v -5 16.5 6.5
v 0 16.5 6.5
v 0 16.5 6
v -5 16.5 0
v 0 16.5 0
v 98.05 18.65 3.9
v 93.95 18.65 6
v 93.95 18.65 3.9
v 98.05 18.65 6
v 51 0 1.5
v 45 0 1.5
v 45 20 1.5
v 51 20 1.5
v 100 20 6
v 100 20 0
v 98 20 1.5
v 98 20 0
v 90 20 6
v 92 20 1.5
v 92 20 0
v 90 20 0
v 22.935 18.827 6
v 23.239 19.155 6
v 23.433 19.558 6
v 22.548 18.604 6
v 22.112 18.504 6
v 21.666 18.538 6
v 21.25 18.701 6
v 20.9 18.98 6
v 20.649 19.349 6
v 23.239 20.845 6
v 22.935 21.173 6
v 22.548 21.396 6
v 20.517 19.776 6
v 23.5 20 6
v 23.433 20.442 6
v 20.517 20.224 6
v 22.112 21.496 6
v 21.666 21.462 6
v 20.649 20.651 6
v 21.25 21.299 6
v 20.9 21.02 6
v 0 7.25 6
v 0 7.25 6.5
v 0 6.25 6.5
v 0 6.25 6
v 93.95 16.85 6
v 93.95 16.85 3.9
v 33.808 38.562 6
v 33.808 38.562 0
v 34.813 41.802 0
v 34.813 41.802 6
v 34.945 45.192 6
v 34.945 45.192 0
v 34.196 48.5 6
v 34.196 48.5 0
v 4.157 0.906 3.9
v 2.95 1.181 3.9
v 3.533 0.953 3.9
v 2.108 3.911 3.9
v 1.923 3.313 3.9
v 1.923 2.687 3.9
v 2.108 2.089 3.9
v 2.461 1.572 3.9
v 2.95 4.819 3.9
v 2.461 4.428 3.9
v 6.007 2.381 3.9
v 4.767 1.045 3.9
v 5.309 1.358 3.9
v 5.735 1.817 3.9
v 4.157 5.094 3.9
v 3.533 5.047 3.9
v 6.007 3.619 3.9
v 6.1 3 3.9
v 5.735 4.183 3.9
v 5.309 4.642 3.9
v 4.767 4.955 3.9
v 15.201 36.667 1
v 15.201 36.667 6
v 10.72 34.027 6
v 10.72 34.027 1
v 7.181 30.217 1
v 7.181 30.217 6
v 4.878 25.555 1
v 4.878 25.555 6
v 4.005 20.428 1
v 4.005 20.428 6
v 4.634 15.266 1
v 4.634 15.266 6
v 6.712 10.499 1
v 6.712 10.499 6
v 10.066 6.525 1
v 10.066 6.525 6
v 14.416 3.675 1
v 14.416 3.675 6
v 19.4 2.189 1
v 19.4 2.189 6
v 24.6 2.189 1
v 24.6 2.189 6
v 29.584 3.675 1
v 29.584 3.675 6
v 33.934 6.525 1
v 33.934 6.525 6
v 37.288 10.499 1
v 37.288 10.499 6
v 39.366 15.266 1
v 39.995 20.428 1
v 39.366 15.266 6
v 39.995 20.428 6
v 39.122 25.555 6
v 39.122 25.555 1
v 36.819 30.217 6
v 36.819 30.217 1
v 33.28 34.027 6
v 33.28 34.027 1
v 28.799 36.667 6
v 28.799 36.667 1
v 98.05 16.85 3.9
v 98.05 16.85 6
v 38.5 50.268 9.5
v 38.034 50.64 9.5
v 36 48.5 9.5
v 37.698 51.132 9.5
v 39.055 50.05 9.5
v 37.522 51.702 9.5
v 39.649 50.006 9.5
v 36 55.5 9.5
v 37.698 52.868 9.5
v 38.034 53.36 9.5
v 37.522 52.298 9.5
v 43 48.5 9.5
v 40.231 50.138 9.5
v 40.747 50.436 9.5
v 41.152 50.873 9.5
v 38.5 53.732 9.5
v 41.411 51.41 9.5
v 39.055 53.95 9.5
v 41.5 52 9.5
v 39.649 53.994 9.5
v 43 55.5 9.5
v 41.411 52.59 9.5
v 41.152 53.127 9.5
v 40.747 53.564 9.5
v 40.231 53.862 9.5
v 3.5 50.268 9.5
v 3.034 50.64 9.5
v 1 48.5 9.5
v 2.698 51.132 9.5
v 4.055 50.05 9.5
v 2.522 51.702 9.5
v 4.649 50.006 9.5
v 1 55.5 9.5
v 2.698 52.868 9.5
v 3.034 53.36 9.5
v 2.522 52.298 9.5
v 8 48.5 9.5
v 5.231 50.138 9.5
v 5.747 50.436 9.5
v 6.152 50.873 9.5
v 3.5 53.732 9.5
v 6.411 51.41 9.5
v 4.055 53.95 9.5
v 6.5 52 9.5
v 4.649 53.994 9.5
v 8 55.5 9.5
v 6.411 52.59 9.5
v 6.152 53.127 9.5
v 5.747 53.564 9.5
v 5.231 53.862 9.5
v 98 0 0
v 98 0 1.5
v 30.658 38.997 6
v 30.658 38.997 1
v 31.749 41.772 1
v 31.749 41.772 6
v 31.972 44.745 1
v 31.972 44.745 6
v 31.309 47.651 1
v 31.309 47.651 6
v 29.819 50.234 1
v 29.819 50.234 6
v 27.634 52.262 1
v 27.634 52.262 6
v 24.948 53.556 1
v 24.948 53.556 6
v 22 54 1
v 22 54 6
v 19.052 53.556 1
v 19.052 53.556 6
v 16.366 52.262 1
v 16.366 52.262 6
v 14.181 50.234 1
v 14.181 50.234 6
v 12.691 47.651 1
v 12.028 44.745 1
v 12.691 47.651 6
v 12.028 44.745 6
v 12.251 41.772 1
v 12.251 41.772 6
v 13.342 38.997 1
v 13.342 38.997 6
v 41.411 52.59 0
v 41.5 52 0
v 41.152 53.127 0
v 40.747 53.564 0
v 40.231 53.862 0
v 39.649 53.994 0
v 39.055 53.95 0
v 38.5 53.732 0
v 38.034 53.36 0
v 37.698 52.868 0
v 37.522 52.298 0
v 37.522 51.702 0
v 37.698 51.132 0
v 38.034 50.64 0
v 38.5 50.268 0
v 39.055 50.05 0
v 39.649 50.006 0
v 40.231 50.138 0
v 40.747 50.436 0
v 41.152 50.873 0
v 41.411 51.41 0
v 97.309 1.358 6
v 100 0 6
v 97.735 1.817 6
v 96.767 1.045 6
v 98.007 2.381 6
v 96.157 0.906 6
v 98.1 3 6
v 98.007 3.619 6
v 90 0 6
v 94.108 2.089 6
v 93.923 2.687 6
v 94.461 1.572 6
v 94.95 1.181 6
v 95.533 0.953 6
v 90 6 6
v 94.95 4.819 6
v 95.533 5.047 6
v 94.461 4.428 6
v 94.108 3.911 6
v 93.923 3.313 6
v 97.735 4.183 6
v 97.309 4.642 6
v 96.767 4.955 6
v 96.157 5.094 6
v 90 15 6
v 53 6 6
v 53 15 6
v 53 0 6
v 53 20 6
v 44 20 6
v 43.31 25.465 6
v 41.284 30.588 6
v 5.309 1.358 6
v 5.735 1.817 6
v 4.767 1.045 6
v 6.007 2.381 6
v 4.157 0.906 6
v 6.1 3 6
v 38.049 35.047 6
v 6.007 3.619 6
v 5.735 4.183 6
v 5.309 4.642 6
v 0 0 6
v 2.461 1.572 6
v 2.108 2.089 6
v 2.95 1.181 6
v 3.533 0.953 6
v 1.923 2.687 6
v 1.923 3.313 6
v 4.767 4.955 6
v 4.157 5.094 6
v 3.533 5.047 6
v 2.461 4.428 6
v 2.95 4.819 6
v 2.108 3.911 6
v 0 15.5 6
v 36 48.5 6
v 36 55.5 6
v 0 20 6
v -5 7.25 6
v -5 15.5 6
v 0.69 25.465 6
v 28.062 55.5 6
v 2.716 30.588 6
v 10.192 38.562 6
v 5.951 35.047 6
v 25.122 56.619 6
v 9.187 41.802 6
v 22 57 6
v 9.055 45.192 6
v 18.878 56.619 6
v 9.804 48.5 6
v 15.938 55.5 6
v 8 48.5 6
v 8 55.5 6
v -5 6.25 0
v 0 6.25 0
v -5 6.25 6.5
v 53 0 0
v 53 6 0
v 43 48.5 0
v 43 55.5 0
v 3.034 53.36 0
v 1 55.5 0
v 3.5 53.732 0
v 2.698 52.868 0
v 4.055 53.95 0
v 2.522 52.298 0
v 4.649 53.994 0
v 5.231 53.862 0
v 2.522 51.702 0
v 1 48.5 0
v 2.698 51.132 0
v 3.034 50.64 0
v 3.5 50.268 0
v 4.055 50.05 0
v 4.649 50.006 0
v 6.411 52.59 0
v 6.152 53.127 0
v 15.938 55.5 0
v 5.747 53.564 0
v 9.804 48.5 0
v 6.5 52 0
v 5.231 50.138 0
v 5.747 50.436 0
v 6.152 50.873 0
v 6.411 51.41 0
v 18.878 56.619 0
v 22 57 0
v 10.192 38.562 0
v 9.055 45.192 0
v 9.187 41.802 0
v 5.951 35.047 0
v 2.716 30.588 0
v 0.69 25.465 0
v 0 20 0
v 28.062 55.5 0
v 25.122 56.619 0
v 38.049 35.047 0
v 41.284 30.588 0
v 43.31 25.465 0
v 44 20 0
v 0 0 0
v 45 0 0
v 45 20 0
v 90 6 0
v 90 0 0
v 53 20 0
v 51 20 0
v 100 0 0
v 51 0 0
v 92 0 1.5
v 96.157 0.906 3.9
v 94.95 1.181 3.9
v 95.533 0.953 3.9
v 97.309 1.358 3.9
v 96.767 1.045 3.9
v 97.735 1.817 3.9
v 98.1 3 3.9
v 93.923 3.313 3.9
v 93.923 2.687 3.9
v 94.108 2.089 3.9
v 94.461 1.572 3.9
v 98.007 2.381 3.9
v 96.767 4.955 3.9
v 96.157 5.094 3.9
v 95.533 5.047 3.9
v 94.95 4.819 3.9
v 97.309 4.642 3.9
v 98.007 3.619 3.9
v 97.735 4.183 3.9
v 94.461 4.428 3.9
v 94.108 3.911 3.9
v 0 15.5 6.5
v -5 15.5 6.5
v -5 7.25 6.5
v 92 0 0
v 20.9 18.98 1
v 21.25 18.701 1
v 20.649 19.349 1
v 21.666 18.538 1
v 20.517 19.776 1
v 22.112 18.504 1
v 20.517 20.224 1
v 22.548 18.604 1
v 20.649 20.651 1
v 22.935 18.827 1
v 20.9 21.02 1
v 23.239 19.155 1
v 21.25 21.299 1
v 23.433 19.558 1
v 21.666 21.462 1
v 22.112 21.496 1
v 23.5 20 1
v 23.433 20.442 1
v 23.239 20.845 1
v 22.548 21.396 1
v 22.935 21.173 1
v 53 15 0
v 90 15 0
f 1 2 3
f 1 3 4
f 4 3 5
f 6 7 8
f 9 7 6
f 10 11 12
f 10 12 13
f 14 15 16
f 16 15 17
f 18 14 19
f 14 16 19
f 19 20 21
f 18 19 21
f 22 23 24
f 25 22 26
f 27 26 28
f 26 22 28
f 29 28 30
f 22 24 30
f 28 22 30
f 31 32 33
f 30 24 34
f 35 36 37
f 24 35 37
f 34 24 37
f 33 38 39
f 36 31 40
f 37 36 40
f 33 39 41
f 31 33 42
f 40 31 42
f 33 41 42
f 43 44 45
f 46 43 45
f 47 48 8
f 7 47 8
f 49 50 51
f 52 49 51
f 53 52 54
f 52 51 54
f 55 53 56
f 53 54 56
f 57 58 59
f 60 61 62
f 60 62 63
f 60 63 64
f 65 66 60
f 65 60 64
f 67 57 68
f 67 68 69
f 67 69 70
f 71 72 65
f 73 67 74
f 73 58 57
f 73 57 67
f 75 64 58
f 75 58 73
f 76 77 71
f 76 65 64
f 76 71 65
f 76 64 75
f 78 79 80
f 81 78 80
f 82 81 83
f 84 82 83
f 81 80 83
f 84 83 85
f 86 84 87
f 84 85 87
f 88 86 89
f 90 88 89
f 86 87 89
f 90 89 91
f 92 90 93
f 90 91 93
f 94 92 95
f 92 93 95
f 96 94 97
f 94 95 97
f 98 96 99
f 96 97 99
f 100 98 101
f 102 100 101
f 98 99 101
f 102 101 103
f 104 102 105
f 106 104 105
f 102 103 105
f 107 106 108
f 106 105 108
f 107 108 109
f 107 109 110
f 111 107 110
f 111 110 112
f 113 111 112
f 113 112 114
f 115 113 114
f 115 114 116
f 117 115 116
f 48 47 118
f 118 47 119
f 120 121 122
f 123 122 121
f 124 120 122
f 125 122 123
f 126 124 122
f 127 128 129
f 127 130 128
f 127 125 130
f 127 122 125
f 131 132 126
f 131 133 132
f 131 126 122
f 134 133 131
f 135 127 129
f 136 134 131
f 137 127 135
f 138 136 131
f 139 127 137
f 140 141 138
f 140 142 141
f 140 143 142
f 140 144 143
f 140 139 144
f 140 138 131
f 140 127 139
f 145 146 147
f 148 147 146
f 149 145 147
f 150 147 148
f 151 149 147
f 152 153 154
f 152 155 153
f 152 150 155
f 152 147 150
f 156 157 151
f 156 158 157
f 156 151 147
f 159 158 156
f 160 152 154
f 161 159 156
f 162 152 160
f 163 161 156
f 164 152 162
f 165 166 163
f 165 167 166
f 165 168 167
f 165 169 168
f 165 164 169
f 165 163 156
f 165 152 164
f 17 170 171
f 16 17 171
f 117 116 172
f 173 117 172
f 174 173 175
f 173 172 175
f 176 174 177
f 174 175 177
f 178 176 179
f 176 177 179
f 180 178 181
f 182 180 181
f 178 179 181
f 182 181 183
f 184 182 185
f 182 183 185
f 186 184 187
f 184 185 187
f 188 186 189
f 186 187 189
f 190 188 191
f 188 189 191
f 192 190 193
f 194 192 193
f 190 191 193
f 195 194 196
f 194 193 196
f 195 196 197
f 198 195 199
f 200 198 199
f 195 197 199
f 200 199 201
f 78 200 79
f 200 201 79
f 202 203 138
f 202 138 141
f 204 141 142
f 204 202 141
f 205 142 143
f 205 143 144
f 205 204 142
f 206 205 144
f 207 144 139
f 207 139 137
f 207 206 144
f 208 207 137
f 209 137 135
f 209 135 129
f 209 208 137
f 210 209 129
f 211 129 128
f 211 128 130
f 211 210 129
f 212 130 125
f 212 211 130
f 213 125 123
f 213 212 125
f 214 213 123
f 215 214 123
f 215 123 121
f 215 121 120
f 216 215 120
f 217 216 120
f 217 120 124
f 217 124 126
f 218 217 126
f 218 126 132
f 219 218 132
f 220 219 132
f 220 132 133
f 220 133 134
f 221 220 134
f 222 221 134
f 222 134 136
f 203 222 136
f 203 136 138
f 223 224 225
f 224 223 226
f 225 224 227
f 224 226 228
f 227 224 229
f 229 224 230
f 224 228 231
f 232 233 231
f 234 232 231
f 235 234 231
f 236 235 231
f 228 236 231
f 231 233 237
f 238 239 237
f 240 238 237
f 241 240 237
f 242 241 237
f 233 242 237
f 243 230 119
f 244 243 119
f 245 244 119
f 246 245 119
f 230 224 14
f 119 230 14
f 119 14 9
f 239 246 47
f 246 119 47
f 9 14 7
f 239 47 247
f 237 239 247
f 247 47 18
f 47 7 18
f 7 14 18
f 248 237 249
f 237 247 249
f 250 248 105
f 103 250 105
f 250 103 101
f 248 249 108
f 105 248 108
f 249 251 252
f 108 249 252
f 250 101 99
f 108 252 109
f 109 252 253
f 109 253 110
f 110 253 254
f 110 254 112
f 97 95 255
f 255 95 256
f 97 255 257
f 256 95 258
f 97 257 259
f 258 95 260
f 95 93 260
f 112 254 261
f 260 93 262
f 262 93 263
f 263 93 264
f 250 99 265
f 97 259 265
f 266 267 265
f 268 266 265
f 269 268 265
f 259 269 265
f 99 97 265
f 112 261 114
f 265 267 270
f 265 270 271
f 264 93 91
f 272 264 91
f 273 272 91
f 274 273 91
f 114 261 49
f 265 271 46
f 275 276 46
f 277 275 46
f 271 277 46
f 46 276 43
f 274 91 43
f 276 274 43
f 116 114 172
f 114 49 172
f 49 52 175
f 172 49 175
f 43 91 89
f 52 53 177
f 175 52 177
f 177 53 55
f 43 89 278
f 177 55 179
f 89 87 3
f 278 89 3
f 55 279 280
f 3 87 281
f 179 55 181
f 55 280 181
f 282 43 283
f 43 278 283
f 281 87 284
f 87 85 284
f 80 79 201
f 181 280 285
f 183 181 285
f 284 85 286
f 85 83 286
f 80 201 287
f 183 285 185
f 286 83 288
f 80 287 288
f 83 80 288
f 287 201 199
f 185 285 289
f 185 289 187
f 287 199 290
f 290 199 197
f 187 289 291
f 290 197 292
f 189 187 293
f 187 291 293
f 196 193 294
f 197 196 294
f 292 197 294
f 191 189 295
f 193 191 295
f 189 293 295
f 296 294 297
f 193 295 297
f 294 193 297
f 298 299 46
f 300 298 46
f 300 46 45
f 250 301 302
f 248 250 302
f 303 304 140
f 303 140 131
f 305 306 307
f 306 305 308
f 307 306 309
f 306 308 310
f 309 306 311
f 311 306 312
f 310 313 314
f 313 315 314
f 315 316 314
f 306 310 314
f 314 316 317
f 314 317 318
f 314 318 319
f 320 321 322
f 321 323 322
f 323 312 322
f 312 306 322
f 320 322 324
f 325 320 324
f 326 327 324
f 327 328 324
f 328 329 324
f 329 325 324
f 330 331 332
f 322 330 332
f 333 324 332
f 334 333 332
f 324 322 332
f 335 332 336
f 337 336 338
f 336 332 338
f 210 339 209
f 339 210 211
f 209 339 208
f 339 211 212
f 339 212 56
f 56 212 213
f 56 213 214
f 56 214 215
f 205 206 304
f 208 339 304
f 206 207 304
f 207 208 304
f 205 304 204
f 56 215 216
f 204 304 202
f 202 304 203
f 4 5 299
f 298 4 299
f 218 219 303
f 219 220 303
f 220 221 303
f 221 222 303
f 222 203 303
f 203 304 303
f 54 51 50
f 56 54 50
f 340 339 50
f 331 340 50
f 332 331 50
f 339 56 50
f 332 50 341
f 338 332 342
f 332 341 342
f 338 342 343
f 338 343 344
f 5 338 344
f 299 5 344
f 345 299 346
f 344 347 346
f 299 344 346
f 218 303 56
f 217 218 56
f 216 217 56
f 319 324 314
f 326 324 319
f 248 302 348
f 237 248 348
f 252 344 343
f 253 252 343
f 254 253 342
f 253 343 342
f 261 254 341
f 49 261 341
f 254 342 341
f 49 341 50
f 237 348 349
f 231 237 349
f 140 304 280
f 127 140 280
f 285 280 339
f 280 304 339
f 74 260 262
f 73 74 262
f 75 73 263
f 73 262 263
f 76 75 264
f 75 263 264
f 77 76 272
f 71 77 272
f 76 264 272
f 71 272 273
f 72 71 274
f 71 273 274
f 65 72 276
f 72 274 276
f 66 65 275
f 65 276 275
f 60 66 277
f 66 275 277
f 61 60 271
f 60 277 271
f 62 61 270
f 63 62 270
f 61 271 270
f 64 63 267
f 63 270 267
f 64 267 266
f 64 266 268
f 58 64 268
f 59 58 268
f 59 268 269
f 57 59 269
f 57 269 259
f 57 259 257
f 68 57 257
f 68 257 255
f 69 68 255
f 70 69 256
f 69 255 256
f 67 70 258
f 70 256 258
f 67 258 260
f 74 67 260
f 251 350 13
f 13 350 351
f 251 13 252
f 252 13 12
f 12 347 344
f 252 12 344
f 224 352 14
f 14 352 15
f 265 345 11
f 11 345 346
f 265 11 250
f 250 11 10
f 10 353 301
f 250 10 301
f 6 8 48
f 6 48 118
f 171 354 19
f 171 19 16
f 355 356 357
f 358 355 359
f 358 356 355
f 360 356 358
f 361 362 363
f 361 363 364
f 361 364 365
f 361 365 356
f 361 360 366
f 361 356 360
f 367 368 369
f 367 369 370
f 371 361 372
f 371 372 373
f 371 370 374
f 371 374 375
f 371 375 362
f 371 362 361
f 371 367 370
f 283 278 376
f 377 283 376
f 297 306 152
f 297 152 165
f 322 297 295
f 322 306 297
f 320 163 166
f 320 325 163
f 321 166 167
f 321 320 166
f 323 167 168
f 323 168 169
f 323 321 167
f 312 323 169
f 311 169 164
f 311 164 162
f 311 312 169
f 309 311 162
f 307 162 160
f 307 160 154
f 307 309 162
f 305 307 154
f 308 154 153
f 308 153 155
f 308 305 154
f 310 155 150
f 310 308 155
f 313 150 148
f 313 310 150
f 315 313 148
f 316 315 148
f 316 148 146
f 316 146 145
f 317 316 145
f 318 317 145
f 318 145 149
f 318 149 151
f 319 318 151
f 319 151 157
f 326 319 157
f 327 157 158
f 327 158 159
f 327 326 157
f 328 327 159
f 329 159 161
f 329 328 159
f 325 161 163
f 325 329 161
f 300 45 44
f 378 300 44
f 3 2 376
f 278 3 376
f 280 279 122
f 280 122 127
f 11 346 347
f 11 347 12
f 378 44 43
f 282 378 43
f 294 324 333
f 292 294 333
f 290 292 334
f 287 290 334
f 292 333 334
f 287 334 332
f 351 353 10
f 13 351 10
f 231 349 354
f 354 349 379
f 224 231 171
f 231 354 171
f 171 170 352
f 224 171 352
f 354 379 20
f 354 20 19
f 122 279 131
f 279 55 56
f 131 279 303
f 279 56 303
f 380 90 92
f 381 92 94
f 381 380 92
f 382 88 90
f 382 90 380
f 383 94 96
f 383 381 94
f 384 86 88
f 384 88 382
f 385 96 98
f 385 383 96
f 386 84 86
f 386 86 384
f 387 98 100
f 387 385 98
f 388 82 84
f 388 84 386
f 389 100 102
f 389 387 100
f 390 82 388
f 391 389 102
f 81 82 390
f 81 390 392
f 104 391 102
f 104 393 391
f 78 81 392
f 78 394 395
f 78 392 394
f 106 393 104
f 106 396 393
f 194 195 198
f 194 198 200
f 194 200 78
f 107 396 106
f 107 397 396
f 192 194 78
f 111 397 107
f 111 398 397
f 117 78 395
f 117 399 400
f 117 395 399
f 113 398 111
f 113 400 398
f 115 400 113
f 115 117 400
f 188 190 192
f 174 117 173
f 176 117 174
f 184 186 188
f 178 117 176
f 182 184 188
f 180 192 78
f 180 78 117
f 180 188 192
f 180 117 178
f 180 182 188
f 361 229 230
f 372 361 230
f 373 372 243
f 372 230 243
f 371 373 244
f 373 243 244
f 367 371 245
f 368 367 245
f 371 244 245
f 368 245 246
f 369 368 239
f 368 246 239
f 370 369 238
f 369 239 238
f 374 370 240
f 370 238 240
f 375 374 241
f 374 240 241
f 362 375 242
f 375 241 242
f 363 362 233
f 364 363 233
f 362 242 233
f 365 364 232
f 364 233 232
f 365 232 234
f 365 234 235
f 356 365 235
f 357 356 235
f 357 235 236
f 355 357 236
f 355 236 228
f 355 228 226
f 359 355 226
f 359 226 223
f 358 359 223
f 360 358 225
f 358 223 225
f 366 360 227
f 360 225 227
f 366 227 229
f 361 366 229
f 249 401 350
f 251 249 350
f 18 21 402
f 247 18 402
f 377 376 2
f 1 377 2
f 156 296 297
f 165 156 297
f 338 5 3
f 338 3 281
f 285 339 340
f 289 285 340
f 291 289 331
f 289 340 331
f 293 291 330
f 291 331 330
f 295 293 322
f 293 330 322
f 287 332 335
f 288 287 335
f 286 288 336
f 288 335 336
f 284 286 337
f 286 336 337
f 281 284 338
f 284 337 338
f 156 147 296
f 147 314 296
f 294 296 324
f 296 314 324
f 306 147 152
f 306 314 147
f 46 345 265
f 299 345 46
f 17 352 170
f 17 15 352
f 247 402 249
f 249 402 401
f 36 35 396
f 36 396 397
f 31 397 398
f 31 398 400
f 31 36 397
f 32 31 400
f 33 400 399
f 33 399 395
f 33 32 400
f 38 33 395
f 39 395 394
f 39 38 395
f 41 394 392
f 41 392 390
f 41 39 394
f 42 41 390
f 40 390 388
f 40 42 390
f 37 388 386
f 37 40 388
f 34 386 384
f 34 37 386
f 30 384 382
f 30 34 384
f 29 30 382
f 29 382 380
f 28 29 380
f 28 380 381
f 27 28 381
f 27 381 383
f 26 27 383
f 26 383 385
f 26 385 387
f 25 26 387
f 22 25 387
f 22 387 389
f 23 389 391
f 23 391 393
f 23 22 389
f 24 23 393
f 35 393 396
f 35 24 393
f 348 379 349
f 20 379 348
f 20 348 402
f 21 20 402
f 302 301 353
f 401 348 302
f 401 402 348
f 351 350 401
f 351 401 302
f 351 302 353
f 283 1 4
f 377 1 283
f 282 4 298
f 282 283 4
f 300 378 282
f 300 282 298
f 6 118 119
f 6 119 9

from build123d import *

# Parameters (mm, degrees)
SKETCH016_R     = 2
PAD012_DEPTH    = 6
SKETCH001_R     = 1.5
POCKET_DEPTH    = 5
SKETCH010_W     = 6
SKETCH010_H     = 1.5
POCKET009_DEPTH = 20
SKETCH017_R     = 2.1
SKETCH017_W     = 4.1
SKETCH017_H     = 1.8
POCKET010_DEPTH = 2.1
PAD013_DEPTH    = 5
SKETCH_W        = 7
SKETCH_H        = 7
SKETCH_R        = 2
PAD014_DEPTH    = 3.5
SKETCH020_R     = 2.1
SKETCH020_W     = 4.1
SKETCH020_H     = 1.8
POCKET017_DEPTH = 2.1


with BuildPart() as part:
    # Sketch016 → Pad012 (new body)
    with BuildSketch(Plane.XY):
        with BuildLine():
            Line((0, 0), (0, 20))
            ThreePointArc((10.1918, 38.5625), (2.715545, 30.588192), (0, 20))
            ThreePointArc((9.803689, 48.5), (9.009903, 43.49267), (10.1918, 38.5625))
            Line((9.803689, 48.5), (1, 48.5))
            Line((1, 48.5), (1, 55.5))
            Line((1, 55.5), (15.937822, 55.5))
            ThreePointArc((28.062178, 55.5), (22, 57), (15.937822, 55.5))
            Line((43, 55.5), (28.062178, 55.5))
            Line((43, 55.5), (43, 48.5))
            Line((34.196311, 48.5), (43, 48.5))
            ThreePointArc((33.8082, 38.5625), (34.990097, 43.49267), (34.196311, 48.5))
            ThreePointArc((44, 20), (41.284455, 30.588191), (33.8082, 38.5625))
            Line((53, 20), (44, 20))
            Line((53, 15), (53, 20))
            Line((90, 15), (53, 15))
            Line((90, 20), (90, 15))
            Line((100, 20), (90, 20))
            Line((100, 0), (100, 20))
            Line((90, 0), (100, 0))
            Line((90, 6), (90, 0))
            Line((53, 6), (90, 6))
            Line((53, 0), (53, 6))
            Line((0, 0), (53, 0))
        make_face()
        with Locations((4.5, 52)):
            Circle(SKETCH016_R, mode=Mode.SUBTRACT)
        with Locations((39.5, 52)):
            Circle(SKETCH016_R, mode=Mode.SUBTRACT)
    extrude(amount=PAD012_DEPTH)

    # Sketch001 → Pocket (cut)
    with BuildSketch(Plane.XY.offset(6)):
        with BuildLine():
            ThreePointArc((28.798693, 36.666667), (22, 54), (15.201307, 36.666667))
            ThreePointArc((15.201307, 36.666667), (22, 2), (28.798693, 36.666667))
        make_face()
        with Locations((22, 20)):
            Circle(SKETCH001_R, mode=Mode.SUBTRACT)
    extrude(amount=-POCKET_DEPTH, mode=Mode.SUBTRACT)

    # Sketch010 → Pocket009 (cut)
    with BuildSketch(Plane.XZ):
        with Locations((48, 0.75)):
            Rectangle(SKETCH010_W, SKETCH010_H)
        with Locations((95, 0.75)):
            Rectangle(SKETCH010_W, SKETCH010_H)
    extrude(amount=-POCKET009_DEPTH, mode=Mode.SUBTRACT)

    # Sketch017 → Pocket010 (cut)
    with BuildSketch(Plane(origin=(0, 0, 0), x_dir=(1, 0, 0), z_dir=(0, 0, -1))):
        with Locations((4, 3)):
            Circle(SKETCH017_R)
        with Locations((96, 3)):
            Circle(SKETCH017_R)
        with Locations((96, 17.75)):
            Rectangle(SKETCH017_W, SKETCH017_H)
    extrude(amount=-POCKET010_DEPTH, mode=Mode.SUBTRACT)

    # Sketch015 → Pad013 (new body)
    with BuildSketch(Plane(origin=(0, 0, 0), x_dir=(0, -1, 0), z_dir=(-1, 0, 0))):
        Polygon((-16.5, 6.5), (-16.5, 0), (-6.25, 0), (-6.25, 6.5), (-7.25, 6.5), (-7.25, 6), (-15.5, 6), (-15.5, 6.5), align=None)
    extrude(amount=PAD013_DEPTH)

    # Sketch → Pad014 (new body)
    with BuildSketch(Plane.XY.offset(6)):
        with Locations((4.5, 52)):
            Rectangle(SKETCH_W, SKETCH_H)
        with Locations((4.5, 52)):
            Circle(SKETCH_R, mode=Mode.SUBTRACT)
        with Locations((39.5, 52)):
            Rectangle(SKETCH_W, SKETCH_H)
        with Locations((39.5, 52)):
            Circle(SKETCH_R, mode=Mode.SUBTRACT)
    extrude(amount=PAD014_DEPTH)

    # Sketch020 → Pocket017 (cut)
    with BuildSketch(Plane.XY.offset(6)):
        with Locations((4, 3)):
            Circle(SKETCH020_R)
        with Locations((96, 3)):
            Circle(SKETCH020_R)
        with Locations((96, 17.75)):
            Rectangle(SKETCH020_W, SKETCH020_H)
    extrude(amount=-POCKET017_DEPTH, mode=Mode.SUBTRACT)


solid = part.part
